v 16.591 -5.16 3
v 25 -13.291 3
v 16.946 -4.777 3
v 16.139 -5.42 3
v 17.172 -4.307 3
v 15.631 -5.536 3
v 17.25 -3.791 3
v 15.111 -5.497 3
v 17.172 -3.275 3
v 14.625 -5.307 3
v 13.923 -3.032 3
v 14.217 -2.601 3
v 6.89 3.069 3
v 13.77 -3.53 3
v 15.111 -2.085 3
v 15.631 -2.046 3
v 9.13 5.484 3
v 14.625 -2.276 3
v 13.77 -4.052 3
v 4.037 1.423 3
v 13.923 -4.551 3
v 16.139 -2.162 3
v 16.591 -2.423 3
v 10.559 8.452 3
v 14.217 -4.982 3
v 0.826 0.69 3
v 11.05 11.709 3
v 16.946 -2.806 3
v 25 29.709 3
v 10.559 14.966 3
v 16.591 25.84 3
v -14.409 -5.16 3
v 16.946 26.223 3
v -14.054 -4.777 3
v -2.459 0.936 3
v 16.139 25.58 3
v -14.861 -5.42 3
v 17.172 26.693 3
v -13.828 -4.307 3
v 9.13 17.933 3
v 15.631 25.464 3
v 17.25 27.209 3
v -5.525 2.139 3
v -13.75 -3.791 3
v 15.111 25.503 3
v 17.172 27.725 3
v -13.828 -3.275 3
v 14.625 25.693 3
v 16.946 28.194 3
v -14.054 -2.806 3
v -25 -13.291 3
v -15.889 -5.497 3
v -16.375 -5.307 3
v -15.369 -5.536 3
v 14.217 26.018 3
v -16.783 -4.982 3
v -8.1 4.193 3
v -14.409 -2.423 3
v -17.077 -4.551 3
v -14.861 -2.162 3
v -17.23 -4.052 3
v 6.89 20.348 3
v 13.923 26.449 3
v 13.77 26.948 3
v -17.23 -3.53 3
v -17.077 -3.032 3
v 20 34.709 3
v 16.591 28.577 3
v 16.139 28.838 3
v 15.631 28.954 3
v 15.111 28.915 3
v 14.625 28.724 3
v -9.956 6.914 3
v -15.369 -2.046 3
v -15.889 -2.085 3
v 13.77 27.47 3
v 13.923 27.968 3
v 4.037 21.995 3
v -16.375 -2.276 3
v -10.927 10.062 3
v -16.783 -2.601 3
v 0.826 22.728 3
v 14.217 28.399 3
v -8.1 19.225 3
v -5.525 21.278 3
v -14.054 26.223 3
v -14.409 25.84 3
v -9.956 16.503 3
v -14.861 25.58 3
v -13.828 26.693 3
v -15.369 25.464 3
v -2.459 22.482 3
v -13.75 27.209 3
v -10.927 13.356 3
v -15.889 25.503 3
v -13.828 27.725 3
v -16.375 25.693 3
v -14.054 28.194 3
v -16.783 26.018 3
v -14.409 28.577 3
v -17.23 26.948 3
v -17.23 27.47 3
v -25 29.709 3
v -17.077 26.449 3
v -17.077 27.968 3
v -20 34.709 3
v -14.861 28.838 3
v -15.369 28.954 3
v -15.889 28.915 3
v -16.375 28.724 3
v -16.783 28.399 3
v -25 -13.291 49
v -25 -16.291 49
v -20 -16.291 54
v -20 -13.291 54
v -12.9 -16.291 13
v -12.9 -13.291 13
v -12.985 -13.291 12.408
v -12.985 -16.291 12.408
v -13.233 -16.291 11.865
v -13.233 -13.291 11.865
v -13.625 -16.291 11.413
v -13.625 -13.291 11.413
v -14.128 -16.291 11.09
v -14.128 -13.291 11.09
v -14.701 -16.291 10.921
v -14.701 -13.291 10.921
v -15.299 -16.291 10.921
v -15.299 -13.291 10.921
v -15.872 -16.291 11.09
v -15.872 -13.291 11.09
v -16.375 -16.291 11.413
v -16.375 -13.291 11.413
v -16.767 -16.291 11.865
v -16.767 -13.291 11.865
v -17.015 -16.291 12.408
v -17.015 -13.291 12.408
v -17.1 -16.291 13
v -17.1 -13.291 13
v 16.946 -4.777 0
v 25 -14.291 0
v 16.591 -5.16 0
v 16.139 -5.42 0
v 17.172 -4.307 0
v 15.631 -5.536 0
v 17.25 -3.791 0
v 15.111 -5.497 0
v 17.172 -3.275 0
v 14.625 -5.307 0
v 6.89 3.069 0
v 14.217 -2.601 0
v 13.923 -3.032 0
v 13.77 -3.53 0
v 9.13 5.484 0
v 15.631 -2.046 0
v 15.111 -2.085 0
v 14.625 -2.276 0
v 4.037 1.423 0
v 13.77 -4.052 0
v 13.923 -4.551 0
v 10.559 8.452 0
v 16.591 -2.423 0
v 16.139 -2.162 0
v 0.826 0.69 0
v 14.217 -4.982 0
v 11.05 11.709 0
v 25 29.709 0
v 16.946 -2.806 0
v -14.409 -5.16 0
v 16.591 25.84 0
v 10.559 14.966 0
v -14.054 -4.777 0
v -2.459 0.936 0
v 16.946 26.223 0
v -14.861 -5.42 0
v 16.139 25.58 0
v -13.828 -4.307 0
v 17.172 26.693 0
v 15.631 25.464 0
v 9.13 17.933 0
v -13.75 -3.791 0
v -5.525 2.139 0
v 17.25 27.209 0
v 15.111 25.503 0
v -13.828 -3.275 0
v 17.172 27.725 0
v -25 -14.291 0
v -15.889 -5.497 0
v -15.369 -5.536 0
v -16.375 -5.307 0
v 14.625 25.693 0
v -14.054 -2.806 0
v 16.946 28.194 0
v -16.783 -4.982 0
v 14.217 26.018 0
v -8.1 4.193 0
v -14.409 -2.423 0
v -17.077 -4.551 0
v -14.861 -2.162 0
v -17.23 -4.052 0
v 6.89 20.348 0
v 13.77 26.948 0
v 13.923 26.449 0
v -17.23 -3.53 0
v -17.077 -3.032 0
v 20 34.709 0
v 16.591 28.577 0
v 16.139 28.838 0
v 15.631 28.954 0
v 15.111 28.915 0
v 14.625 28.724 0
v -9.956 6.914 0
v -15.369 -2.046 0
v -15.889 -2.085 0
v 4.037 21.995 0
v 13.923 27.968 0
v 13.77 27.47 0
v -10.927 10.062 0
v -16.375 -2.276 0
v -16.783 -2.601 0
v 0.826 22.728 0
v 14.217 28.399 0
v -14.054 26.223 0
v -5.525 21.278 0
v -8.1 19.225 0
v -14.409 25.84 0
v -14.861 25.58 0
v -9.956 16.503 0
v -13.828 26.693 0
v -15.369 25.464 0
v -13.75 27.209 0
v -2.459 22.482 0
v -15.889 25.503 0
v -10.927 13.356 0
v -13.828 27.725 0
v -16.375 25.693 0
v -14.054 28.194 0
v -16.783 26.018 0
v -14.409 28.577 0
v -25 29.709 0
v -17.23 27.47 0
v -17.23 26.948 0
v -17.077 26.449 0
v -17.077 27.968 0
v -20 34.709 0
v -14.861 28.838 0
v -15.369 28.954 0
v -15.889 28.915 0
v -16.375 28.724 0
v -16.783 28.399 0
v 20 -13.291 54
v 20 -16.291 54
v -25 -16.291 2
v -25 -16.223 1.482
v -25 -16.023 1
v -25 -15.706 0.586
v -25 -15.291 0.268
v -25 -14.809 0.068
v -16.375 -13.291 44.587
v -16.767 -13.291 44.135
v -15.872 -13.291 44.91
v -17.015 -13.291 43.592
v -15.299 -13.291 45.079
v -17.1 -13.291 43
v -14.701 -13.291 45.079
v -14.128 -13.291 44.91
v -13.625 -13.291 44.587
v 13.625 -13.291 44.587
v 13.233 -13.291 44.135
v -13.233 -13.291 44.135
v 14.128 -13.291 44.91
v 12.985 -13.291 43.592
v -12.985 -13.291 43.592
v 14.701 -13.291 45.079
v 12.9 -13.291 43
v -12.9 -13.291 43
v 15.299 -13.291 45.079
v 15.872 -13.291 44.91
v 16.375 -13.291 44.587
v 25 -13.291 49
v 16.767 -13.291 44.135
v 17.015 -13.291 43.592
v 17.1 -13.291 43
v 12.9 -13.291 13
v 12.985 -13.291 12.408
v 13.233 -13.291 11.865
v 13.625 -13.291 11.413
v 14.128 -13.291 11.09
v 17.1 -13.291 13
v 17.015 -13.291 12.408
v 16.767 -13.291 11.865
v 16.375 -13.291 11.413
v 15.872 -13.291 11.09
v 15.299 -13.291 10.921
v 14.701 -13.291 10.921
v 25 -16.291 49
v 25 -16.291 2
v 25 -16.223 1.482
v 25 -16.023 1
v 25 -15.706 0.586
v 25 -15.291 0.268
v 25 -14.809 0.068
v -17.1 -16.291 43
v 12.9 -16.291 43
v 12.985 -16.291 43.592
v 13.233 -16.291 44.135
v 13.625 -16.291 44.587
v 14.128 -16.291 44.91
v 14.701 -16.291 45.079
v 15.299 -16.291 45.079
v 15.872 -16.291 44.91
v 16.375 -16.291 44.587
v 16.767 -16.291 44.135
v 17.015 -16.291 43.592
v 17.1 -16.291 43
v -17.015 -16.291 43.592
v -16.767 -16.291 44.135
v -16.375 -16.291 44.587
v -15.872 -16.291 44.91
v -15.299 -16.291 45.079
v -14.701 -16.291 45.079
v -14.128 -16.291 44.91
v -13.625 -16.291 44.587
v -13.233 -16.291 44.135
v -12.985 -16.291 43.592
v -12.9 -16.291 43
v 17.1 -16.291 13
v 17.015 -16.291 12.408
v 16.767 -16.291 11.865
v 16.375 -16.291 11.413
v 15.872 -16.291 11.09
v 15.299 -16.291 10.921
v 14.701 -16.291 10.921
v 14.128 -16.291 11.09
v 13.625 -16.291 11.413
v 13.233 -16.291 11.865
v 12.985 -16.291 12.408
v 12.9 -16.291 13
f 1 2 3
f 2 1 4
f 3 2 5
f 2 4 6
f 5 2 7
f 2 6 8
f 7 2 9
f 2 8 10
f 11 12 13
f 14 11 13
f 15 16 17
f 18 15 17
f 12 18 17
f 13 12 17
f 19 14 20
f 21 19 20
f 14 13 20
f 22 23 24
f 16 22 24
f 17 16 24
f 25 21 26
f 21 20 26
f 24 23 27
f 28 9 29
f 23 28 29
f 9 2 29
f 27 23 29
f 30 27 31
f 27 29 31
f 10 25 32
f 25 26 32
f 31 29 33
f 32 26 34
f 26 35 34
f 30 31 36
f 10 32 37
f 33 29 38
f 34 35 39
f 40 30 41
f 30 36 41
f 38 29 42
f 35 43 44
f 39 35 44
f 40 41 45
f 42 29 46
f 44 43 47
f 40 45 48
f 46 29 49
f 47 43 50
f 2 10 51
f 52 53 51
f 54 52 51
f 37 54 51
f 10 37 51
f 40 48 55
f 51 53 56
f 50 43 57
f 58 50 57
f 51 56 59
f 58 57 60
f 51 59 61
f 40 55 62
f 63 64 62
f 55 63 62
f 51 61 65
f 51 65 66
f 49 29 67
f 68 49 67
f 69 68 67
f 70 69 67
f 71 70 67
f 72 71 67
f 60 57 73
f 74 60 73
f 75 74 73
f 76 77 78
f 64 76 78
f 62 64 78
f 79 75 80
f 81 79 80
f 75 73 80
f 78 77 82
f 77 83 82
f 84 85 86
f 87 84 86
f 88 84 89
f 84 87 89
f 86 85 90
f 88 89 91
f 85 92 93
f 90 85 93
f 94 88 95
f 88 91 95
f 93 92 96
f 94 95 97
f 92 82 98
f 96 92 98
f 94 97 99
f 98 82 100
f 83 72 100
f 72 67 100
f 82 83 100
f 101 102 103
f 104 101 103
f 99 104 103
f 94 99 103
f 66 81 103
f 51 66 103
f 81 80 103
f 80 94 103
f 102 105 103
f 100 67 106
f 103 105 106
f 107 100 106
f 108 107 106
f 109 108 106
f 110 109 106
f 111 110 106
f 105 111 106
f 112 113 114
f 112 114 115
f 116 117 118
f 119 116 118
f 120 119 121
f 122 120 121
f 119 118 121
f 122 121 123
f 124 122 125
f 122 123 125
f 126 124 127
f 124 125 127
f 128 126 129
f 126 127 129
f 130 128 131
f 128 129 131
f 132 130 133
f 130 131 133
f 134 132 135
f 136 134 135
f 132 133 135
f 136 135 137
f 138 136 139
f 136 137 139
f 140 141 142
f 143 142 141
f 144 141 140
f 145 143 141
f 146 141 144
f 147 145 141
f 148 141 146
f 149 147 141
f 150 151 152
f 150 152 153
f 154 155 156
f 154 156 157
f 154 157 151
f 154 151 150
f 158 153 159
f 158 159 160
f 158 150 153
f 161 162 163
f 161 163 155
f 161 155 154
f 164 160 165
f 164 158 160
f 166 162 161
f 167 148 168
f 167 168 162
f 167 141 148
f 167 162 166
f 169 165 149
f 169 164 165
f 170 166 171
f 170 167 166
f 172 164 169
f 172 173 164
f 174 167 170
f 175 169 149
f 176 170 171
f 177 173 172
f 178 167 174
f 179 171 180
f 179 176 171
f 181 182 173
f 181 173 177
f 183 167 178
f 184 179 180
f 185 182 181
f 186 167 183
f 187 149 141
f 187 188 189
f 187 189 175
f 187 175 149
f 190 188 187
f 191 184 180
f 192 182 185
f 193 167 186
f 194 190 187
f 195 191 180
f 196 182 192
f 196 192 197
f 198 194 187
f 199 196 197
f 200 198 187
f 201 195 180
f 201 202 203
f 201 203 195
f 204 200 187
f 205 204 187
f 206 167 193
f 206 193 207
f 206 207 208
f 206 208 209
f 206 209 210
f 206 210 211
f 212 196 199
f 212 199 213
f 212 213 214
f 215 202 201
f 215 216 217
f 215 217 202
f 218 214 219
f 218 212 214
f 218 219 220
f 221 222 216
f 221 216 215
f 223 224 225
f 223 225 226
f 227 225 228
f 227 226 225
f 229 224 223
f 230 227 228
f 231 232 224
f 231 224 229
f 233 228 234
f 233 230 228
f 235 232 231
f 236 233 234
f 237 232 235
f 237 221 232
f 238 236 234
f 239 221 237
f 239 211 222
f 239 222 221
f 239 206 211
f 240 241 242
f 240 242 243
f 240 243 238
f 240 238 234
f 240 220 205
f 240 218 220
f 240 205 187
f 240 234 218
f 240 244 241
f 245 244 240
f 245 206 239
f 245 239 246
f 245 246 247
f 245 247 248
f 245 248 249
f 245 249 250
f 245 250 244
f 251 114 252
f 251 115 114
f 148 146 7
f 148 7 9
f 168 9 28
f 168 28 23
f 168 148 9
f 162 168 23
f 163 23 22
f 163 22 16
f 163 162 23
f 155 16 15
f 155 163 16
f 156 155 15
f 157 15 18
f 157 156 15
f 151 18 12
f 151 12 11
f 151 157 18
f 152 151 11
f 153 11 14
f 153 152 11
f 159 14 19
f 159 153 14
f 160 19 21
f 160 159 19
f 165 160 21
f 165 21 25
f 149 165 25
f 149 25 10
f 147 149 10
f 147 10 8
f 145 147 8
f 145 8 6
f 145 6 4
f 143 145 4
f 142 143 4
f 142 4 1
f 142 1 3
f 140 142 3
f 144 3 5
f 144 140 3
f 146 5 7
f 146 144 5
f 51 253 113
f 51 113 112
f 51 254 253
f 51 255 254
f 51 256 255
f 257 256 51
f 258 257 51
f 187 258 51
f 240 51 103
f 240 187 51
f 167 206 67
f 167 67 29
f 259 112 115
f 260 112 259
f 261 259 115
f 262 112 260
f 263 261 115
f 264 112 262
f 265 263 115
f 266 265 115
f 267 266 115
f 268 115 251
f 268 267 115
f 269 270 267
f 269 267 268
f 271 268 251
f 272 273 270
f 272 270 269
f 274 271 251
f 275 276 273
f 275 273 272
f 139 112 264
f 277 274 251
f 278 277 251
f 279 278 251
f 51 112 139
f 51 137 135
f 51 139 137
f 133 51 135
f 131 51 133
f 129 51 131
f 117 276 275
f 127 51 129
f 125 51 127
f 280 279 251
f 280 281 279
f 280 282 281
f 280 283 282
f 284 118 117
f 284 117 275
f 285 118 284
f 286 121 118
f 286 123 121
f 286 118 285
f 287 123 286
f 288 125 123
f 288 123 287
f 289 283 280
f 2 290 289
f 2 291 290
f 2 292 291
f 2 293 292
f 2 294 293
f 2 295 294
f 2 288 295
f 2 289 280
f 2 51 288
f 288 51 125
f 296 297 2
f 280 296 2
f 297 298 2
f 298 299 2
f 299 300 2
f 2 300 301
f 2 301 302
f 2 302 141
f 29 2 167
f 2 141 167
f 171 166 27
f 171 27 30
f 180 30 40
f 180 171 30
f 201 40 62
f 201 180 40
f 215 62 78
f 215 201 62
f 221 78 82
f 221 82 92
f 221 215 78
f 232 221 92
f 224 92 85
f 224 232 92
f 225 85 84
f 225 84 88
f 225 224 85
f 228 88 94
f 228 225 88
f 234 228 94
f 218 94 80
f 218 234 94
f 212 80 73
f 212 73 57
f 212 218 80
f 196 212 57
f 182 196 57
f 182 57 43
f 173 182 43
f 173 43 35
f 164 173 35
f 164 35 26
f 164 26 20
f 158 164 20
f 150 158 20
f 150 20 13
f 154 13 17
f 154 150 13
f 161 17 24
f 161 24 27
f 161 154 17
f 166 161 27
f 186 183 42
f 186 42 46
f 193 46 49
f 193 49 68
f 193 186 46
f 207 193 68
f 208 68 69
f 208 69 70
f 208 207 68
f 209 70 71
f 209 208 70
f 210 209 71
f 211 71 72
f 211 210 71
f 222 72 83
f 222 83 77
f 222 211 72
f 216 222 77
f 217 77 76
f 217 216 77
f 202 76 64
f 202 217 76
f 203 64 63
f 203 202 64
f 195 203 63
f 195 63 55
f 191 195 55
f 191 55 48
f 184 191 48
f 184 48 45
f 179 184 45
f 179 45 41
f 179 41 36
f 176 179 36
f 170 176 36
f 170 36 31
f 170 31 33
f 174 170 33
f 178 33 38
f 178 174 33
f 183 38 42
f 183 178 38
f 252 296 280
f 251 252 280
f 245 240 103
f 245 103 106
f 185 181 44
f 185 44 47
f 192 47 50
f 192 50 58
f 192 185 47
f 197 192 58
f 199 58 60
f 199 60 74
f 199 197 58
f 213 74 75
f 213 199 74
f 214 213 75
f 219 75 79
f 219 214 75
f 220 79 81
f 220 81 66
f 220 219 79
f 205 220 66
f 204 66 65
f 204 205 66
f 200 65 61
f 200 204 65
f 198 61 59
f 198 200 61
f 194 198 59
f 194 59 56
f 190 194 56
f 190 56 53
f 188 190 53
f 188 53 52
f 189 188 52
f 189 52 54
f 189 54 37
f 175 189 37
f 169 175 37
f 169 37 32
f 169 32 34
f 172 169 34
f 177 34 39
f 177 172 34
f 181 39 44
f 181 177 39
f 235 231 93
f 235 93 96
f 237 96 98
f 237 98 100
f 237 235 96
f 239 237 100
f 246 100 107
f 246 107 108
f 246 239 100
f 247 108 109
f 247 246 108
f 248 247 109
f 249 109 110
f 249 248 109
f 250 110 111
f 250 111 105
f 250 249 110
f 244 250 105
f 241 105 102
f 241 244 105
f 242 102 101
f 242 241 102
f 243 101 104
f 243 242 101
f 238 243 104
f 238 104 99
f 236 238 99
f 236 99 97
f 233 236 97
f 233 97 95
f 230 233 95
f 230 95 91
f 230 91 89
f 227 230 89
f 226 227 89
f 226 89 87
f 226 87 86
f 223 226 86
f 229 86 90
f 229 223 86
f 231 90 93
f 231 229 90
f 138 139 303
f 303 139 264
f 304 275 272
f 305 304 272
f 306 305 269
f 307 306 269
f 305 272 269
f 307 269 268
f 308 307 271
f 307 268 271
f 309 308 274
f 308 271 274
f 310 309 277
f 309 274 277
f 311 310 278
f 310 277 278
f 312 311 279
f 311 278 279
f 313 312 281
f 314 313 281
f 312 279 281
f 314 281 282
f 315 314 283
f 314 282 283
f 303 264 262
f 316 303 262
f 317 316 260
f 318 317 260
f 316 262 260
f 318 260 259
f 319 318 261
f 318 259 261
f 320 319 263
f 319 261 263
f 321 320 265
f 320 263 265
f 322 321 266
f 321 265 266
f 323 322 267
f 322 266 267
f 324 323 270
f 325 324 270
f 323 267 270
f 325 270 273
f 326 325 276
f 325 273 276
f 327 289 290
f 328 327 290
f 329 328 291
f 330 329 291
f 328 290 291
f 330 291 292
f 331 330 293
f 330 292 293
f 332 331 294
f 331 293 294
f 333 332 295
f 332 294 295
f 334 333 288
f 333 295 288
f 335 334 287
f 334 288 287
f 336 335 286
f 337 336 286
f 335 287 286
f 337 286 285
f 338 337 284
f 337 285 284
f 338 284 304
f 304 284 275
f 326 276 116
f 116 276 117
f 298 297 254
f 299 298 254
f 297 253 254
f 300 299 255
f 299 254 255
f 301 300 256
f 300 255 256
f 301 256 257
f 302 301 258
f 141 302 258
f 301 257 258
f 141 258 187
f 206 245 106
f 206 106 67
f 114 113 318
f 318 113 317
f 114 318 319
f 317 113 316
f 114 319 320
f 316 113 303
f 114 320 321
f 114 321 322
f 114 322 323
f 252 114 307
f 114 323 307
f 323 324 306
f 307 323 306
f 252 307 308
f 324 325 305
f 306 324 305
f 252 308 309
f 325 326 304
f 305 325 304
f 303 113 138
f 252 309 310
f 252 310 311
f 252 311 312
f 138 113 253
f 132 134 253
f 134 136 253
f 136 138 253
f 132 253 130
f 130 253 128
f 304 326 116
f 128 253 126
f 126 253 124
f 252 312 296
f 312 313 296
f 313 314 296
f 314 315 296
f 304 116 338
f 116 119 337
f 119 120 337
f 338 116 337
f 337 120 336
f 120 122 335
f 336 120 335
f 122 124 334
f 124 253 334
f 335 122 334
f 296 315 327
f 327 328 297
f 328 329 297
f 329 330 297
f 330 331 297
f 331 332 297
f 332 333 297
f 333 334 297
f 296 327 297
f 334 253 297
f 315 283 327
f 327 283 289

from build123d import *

# Parameters (mm, degrees)
SKETCH_1_R          = 1.75
SKETCH_1_R_2        = 11.05
EXTRUDE_1_DEPTH     = 3
SKETCH_2_W          = 50
SKETCH_2_H          = 3
EXTRUDE_2_DEPTH     = 51
FILLET_1_R          = 2
CUT_EXTRUDE_1_DEPTH = 51
CHAMFER_1_SIZE      = 5


with BuildPart() as part:
    # 草图1 → 凸台-拉伸1 (new body)
    with BuildSketch(Plane.XY):
        Polygon((25, 29.708680022), (25, -16.291319978), (-25, -16.291319978), (-25, 29.708680022), (-20, 34.708680022), (20, 34.708680022), align=None)
        with Locations((-15.5, 27.208680022)):
            Circle(SKETCH_1_R, mode=Mode.SUBTRACT)
        with Locations((15.5, 27.208680022)):
            Circle(SKETCH_1_R, mode=Mode.SUBTRACT)
        with Locations((-15.5, -3.791319978)):
            Circle(SKETCH_1_R, mode=Mode.SUBTRACT)
        with Locations((15.5, -3.791319978)):
            Circle(SKETCH_1_R, mode=Mode.SUBTRACT)
        with Locations((0, 11.708680022)):
            Circle(SKETCH_1_R_2, mode=Mode.SUBTRACT)
    extrude(amount=EXTRUDE_1_DEPTH)

    # 草图2 → 凸台-拉伸2 (add)
    with BuildSketch(Plane.XY.offset(3)):
        with Locations((0, -14.791319978)):
            Rectangle(SKETCH_2_W, SKETCH_2_H)
    extrude(amount=EXTRUDE_2_DEPTH)

    # 圆角1
    fillet_1_edges = [part.edges().sort_by_distance(p)[0] for p in [
        (0, -16.291319978, 0),
    ]]
    fillet(fillet_1_edges, radius=FILLET_1_R)

    # 草图3 → 切除-拉伸1 (cut)
    with BuildSketch(Plane(origin=(0, -13.291319978, 0), x_dir=(1, 0, 0), z_dir=(0, 1, 0))):
        with BuildLine():
            Line((-17.1, -13), (-17.1, -43))
            ThreePointArc((-17.1, -43), (-15, -45.1), (-12.9, -43))
            Line((-12.9, -43), (-12.9, -13))
            ThreePointArc((-12.9, -13), (-15, -10.9), (-17.1, -13))
        make_face()
        with BuildLine():
            Line((12.9, -13), (12.9, -43))
            ThreePointArc((12.9, -43), (15, -45.1), (17.1, -43))
            Line((17.1, -43), (17.1, -13))
            ThreePointArc((17.1, -13), (15, -10.9), (12.9, -13))
        make_face()
    extrude(amount=-CUT_EXTRUDE_1_DEPTH, mode=Mode.SUBTRACT)

    # 倒角1
    chamfer_1_edges = [part.edges().sort_by_distance(p)[0] for p in [
        (-25, -14.791319978, 54),
        (25, -14.791319978, 54),
    ]]
    chamfer(chamfer_1_edges, length=CHAMFER_1_SIZE)


solid = part.part
